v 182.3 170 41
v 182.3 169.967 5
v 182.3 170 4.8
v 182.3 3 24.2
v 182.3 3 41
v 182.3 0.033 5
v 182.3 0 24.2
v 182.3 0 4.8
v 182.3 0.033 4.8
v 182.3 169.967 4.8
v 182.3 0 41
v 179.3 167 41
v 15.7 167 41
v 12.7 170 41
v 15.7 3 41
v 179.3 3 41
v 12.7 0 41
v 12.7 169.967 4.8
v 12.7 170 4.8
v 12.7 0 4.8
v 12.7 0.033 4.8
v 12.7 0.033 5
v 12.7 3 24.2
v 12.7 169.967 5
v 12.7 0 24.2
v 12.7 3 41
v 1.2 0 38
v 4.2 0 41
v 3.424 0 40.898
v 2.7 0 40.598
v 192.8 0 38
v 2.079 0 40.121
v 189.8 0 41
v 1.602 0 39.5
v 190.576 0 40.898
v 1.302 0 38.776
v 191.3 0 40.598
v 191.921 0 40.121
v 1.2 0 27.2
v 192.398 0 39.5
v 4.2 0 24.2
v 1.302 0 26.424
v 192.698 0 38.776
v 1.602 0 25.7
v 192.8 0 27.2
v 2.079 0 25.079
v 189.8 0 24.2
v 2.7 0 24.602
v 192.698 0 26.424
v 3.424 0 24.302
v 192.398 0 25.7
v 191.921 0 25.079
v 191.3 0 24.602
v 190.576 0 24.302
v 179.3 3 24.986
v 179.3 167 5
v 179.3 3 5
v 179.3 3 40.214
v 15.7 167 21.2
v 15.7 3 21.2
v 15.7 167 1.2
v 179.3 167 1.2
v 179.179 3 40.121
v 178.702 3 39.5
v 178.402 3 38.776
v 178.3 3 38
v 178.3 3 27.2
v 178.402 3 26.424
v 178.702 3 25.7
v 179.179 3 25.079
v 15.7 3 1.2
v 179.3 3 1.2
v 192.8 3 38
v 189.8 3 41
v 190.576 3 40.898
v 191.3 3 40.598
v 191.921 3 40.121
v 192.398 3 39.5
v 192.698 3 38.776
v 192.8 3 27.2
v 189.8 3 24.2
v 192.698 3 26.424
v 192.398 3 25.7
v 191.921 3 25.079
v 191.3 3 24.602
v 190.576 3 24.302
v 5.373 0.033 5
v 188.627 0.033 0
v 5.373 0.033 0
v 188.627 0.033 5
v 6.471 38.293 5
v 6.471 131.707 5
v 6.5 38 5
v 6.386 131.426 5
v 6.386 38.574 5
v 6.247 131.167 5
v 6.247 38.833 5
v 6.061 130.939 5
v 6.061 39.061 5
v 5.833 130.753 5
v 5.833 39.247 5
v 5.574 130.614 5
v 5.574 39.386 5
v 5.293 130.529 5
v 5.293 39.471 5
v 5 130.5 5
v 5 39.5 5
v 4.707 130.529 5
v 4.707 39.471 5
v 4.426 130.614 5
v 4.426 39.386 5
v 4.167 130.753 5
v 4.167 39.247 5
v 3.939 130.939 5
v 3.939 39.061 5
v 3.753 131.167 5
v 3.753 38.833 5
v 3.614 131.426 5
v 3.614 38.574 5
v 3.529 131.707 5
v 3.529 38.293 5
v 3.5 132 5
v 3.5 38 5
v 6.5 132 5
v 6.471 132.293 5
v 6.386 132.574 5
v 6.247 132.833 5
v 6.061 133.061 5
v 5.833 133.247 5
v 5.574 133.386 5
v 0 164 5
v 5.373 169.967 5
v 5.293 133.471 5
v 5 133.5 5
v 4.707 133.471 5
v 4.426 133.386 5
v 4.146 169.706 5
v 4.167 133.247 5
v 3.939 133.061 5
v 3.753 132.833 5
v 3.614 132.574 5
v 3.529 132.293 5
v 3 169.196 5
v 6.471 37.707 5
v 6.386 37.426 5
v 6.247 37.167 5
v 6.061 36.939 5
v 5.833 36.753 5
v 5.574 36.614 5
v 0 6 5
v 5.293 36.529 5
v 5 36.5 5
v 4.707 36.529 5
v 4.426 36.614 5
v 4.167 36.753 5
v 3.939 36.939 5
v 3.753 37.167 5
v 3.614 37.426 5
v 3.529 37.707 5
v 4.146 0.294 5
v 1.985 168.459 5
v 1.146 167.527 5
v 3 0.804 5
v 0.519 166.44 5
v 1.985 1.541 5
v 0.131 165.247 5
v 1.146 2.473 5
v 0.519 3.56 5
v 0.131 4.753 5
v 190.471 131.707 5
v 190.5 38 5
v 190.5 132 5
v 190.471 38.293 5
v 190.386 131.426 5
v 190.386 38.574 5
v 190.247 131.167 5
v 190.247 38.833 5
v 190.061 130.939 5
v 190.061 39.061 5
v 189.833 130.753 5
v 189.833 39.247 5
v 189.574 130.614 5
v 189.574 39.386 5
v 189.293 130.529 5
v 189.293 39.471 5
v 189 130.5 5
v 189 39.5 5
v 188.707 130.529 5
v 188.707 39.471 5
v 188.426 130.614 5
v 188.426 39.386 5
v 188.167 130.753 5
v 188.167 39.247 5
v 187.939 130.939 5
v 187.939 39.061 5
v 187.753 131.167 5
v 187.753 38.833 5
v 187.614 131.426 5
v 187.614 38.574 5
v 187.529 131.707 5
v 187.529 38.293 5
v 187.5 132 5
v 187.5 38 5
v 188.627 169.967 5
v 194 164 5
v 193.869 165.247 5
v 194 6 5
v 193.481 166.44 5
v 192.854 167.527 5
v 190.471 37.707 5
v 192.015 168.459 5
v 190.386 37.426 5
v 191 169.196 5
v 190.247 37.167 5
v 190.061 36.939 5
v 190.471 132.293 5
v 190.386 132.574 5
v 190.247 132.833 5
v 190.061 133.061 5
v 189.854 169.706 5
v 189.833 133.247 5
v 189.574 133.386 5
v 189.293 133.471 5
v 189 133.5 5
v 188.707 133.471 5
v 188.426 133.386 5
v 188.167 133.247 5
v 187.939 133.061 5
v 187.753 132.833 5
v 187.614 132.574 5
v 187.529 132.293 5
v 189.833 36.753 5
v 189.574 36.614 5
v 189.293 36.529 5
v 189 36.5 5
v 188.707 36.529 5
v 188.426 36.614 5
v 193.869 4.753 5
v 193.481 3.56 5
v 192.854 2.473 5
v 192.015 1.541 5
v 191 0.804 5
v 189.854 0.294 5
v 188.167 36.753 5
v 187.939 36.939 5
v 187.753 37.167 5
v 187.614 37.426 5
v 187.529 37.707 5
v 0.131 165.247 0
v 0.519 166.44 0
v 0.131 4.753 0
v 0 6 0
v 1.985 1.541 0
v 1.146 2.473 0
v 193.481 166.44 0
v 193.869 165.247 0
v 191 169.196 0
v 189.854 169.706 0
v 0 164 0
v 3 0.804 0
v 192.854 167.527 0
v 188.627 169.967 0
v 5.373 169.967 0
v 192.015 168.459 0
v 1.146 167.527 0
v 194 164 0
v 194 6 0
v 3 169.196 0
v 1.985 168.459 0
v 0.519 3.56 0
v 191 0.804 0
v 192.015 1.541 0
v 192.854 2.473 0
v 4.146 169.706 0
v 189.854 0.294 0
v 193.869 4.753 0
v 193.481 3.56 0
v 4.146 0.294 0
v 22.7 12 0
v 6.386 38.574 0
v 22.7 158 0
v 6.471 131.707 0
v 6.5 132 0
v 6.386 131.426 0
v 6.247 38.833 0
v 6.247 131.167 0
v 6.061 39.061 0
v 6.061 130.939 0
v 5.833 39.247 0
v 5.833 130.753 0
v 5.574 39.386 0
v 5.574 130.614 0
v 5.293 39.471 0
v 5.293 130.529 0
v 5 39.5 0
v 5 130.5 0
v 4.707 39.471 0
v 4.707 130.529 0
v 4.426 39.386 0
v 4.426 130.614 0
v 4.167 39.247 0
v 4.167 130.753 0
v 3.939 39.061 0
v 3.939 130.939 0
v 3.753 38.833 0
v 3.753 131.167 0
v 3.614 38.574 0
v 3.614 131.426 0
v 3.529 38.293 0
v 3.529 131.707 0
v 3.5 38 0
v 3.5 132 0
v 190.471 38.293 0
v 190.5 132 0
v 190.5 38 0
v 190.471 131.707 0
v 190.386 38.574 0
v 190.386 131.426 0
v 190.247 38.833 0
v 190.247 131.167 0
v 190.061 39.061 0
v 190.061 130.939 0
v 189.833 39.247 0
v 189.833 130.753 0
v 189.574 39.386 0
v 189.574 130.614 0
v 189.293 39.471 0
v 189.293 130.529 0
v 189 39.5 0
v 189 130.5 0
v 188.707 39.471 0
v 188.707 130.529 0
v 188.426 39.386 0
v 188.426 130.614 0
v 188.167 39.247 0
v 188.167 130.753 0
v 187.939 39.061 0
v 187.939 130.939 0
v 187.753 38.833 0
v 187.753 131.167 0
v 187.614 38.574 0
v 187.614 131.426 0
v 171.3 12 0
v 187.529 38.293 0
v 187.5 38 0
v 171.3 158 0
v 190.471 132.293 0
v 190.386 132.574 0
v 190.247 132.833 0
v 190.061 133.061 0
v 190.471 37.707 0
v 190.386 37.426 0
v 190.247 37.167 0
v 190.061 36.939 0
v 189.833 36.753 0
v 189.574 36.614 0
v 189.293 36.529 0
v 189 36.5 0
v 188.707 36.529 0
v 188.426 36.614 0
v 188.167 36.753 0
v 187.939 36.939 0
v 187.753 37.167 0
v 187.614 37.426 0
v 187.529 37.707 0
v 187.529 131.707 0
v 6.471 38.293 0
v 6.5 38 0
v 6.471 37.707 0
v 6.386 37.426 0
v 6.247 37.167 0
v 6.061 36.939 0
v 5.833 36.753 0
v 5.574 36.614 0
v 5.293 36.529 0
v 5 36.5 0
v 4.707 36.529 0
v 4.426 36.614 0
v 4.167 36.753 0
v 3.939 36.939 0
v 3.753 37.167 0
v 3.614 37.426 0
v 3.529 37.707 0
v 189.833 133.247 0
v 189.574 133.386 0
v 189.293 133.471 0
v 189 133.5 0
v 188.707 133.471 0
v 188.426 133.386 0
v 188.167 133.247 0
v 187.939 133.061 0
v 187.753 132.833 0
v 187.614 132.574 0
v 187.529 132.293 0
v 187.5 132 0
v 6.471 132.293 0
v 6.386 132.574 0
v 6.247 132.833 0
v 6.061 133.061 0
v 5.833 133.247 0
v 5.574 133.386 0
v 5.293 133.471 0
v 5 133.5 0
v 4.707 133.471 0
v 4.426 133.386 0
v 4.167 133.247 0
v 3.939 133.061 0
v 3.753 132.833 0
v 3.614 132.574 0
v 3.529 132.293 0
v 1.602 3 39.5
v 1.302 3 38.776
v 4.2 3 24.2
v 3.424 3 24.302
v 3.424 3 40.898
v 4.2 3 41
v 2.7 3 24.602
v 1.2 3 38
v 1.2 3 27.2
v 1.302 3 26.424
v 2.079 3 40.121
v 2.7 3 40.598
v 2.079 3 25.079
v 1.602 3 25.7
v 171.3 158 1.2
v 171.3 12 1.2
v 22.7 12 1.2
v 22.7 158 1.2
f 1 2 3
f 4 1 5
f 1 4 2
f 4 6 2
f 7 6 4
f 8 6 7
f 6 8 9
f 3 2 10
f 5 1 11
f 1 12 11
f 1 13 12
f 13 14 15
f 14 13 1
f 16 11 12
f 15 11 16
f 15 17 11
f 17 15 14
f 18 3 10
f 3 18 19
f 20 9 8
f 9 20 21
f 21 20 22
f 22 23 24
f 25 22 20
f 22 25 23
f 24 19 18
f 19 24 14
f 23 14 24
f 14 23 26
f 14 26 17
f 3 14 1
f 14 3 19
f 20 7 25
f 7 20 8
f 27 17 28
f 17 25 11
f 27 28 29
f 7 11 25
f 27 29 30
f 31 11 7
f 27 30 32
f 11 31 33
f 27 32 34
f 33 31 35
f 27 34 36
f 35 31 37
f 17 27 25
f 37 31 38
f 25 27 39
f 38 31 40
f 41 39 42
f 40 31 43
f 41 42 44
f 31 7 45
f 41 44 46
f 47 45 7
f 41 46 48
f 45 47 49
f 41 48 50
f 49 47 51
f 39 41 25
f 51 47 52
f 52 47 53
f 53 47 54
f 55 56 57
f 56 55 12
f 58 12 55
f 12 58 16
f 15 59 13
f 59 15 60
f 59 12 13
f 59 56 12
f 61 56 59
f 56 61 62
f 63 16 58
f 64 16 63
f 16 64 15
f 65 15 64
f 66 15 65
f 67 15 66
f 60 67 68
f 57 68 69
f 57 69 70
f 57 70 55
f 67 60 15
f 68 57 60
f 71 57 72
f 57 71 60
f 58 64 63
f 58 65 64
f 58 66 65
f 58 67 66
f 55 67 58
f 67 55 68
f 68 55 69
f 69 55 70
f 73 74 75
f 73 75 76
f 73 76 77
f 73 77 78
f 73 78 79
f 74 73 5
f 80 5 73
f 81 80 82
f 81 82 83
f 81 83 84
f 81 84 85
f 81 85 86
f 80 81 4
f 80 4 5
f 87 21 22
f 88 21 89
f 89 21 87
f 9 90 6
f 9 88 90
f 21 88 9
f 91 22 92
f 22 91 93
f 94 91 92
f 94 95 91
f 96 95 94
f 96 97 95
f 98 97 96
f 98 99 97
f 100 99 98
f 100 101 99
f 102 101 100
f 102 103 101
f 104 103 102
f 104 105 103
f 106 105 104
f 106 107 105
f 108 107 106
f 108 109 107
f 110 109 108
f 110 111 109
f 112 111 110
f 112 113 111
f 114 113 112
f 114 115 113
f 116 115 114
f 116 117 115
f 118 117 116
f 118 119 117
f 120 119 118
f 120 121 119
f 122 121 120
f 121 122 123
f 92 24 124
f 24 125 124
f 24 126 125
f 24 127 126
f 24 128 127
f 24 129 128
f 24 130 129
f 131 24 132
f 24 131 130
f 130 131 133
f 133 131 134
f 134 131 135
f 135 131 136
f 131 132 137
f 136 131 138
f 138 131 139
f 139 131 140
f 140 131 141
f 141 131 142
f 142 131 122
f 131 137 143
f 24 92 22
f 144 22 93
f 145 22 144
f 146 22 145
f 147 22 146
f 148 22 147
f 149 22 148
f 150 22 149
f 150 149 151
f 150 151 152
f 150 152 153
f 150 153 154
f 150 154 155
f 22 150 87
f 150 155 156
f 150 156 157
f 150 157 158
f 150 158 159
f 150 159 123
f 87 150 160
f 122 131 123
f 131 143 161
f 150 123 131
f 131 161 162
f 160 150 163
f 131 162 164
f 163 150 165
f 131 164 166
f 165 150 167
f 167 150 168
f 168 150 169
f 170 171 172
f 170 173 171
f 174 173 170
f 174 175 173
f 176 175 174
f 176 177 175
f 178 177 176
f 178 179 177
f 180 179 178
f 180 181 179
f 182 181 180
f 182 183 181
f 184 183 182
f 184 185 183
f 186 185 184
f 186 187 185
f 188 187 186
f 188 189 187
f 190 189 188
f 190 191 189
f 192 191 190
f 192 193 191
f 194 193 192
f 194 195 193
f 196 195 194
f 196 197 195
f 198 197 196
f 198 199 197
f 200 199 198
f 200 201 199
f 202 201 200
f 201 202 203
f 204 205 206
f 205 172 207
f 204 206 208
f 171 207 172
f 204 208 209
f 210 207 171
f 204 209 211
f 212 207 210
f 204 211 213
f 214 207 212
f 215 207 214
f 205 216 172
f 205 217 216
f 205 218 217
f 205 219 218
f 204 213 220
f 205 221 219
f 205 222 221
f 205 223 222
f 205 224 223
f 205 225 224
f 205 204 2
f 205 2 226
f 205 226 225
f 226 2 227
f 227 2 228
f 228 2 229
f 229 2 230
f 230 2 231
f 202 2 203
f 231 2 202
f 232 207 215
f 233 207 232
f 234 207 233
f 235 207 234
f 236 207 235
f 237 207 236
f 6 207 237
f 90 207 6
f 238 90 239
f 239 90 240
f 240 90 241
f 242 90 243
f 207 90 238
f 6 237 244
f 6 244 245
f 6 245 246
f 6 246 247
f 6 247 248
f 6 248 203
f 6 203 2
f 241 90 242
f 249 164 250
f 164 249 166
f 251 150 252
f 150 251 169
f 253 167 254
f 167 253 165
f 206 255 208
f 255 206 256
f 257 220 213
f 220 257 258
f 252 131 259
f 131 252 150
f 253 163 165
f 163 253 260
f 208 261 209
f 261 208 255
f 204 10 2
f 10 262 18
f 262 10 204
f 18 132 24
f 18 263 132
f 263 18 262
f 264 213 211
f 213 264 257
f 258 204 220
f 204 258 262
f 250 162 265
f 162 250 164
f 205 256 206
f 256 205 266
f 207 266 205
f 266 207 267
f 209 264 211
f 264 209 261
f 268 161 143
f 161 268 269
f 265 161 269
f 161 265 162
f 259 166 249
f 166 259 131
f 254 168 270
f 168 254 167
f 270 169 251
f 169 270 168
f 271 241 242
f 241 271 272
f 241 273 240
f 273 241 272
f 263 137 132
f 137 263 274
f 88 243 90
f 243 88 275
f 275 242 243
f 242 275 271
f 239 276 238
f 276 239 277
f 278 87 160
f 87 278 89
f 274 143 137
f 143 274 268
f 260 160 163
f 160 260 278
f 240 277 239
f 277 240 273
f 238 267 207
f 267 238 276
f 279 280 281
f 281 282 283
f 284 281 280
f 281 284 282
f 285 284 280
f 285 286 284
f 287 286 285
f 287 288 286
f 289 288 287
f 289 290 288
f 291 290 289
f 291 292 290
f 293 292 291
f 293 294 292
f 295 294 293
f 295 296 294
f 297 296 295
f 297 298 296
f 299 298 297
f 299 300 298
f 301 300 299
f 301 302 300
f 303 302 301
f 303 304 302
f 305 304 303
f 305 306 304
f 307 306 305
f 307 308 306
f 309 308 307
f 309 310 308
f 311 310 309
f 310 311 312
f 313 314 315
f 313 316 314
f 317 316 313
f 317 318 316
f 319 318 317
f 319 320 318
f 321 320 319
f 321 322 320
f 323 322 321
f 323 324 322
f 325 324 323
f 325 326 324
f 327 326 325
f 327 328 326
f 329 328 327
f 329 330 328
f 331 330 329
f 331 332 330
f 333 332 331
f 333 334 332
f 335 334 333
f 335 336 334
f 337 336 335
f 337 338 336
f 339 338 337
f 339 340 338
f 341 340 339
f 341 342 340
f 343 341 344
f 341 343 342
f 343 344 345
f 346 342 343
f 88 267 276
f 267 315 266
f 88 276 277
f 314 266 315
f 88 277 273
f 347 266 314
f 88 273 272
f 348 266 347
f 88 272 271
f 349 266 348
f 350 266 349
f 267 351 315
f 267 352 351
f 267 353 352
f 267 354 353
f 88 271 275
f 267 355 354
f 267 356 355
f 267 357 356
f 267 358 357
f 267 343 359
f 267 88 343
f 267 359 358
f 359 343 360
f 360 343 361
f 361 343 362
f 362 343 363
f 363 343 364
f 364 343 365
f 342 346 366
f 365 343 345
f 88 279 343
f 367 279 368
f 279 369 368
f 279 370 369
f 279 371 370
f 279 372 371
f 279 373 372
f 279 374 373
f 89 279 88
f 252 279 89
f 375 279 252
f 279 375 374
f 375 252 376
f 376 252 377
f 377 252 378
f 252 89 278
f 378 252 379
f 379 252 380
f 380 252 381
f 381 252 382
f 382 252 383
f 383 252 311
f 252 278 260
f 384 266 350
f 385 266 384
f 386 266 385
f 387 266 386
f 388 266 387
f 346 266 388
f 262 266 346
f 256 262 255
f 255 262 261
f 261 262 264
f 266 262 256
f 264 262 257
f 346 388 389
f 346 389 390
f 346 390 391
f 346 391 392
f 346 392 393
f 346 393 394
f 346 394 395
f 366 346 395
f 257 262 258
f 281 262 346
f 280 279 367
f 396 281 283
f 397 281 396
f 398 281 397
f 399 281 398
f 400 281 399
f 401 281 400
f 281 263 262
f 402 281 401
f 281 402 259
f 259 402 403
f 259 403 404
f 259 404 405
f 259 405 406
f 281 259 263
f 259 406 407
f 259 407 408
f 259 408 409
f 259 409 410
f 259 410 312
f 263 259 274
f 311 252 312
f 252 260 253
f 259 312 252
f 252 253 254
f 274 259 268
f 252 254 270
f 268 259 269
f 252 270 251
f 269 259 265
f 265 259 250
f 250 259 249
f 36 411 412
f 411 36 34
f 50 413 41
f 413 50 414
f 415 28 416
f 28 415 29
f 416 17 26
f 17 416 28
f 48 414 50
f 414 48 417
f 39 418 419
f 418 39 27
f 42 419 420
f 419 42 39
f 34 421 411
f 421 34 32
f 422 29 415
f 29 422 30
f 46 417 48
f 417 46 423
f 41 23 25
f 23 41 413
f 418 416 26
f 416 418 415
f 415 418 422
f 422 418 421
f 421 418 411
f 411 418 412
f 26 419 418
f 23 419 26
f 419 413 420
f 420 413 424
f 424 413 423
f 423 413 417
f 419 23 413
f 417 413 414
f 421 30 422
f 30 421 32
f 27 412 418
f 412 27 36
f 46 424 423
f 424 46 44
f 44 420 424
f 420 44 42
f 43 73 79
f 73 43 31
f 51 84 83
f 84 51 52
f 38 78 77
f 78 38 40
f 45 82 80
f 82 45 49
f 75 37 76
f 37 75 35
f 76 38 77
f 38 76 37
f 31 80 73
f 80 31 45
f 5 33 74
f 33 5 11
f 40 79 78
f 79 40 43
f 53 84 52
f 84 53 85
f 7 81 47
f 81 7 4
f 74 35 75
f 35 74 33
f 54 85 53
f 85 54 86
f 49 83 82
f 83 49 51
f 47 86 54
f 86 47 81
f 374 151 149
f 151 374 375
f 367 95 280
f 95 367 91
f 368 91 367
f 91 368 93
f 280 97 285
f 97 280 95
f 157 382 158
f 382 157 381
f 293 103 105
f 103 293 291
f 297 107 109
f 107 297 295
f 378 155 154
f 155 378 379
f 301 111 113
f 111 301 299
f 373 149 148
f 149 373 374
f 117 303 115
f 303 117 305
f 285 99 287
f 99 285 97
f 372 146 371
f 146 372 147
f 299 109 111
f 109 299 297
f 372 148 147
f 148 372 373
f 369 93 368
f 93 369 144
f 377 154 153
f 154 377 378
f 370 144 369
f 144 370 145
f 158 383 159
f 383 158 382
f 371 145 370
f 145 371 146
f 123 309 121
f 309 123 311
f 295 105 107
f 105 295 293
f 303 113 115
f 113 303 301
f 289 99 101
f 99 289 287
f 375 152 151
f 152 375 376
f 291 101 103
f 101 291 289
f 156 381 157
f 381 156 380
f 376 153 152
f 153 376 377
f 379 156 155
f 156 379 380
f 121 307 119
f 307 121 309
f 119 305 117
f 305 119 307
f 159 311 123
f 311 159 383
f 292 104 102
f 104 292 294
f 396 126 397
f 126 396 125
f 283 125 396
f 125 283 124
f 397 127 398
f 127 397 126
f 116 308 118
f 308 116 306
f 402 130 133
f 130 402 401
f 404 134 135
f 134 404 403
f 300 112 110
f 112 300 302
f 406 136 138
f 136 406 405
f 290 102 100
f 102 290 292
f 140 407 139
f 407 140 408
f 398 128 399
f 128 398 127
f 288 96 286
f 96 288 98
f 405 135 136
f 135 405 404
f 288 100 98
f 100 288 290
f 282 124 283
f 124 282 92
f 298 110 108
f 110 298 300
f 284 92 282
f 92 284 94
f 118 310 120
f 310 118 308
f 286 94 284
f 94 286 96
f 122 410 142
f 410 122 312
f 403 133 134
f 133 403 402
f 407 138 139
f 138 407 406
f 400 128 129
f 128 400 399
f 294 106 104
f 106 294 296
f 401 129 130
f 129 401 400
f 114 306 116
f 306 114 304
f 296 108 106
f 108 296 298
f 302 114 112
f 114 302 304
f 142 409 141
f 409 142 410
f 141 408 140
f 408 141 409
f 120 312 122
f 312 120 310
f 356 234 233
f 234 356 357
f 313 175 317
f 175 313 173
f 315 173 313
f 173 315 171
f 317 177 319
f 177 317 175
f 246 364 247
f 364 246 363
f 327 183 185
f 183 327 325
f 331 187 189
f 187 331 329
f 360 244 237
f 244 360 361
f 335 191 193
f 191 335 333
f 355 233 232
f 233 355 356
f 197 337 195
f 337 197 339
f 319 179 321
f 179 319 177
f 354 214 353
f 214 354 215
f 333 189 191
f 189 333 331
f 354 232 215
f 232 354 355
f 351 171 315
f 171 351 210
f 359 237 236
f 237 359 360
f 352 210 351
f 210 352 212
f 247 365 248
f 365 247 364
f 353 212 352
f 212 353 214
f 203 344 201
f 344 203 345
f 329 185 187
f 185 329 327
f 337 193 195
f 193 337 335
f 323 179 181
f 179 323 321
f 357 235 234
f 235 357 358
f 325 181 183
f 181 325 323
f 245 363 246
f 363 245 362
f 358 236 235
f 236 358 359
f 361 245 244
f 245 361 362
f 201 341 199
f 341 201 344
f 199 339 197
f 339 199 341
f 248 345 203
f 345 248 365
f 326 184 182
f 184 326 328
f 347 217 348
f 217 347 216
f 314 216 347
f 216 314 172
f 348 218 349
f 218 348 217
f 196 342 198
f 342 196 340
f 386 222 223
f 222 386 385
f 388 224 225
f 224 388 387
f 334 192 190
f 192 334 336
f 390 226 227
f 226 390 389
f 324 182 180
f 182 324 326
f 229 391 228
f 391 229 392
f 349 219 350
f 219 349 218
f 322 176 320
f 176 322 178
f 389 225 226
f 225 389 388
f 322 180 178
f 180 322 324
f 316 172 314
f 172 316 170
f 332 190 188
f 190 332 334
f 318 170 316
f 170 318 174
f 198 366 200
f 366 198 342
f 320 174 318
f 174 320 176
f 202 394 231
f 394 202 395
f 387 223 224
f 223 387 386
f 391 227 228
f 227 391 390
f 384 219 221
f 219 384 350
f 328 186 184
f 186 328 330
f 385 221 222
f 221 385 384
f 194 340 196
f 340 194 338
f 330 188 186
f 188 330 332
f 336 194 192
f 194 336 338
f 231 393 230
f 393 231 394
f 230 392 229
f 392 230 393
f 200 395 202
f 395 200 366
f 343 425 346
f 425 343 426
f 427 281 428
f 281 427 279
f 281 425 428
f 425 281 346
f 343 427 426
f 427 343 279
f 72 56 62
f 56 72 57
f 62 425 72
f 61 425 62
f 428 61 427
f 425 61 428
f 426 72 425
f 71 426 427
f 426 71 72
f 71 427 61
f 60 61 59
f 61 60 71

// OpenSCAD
difference() {
  union() {
    
    translate([6,6,0]) minkowski() {
      cube([182,158,3]);
      cylinder(r=6,h=2,$fn=30);
    }
    translate([12.7,0,4.8]) difference() {
      cube([169.60,170,36.2]);
      translate([3,3,0]) cube([163.60,164,40]);
    }
    
    translate([4.2,1,27.2]) minkowski() {
      cube([8.50,2,10.8]);
      rotate([90,0,0]) cylinder(r=3,h=1,$fn=24);
    }
    
    translate([181.3,1,27.2]) minkowski() {
      cube([8.50,2,10.8]);
      rotate([90,0,0]) cylinder(r=3,h=1,$fn=24);
    }
  }
  translate([5,38,-1]) cylinder(r=1.5,h=10,$fn=32);
  translate([5,132,-1]) cylinder(r=1.5,h=10,$fn=32);
  translate([189,38,-1]) cylinder(r=1.5,h=10,$fn=32);
  translate([189,132,-1]) cylinder(r=1.5,h=10,$fn=32);
  translate([22.7,12,-1]) cube([148.60,146,20]);
  // opcional - pra abaixar
  translate([15.7,3,1.2]) cube([163.60,164,20]);
}
